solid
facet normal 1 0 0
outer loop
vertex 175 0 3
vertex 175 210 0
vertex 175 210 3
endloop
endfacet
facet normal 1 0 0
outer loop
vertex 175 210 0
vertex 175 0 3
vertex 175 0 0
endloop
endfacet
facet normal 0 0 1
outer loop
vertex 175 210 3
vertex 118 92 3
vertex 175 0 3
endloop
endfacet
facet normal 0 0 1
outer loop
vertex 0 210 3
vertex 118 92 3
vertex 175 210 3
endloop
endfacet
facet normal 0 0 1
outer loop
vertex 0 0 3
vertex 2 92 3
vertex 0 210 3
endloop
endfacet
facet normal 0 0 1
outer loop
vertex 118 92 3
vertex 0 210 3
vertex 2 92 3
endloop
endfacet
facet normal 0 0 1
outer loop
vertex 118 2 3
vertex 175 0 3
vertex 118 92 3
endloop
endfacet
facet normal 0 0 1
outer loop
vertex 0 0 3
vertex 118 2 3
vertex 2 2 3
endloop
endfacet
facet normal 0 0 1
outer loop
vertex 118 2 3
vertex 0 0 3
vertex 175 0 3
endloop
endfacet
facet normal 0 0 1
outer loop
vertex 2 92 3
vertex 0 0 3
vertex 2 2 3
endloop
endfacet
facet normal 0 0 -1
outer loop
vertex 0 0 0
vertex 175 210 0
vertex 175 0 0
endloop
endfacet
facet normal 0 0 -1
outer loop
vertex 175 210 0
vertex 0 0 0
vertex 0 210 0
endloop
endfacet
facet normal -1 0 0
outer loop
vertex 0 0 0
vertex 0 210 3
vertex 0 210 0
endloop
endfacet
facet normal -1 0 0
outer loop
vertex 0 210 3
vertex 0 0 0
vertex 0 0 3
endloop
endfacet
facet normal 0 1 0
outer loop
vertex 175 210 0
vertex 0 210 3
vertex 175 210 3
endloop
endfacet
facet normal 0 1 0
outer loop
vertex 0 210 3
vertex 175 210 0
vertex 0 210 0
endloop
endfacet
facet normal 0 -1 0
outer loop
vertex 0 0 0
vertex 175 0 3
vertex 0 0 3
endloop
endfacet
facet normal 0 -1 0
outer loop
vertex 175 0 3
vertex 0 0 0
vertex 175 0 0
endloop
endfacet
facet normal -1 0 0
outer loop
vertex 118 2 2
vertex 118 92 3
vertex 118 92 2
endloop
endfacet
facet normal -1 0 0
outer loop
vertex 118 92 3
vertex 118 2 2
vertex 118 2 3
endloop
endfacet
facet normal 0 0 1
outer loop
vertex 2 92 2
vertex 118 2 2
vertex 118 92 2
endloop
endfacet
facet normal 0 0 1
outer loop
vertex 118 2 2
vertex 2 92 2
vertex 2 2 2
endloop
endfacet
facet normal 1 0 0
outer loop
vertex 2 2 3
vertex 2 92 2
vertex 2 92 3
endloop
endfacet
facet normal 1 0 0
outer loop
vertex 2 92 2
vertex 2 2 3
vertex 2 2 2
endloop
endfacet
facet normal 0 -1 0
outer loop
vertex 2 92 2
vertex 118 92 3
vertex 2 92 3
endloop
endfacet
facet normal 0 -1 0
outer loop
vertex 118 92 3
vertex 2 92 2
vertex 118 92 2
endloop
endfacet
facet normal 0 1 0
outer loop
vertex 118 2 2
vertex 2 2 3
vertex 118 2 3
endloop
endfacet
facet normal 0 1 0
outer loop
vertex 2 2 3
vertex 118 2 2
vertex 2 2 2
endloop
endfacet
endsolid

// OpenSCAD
difference(){
	union(){ 

        translate([0,0,0]){
           cube([175,210,3], center=false);
        }
        

	}
	union() {
        translate([2,2,2]){
           cube([58+58,90,99], center=false);
        }
	}
}
